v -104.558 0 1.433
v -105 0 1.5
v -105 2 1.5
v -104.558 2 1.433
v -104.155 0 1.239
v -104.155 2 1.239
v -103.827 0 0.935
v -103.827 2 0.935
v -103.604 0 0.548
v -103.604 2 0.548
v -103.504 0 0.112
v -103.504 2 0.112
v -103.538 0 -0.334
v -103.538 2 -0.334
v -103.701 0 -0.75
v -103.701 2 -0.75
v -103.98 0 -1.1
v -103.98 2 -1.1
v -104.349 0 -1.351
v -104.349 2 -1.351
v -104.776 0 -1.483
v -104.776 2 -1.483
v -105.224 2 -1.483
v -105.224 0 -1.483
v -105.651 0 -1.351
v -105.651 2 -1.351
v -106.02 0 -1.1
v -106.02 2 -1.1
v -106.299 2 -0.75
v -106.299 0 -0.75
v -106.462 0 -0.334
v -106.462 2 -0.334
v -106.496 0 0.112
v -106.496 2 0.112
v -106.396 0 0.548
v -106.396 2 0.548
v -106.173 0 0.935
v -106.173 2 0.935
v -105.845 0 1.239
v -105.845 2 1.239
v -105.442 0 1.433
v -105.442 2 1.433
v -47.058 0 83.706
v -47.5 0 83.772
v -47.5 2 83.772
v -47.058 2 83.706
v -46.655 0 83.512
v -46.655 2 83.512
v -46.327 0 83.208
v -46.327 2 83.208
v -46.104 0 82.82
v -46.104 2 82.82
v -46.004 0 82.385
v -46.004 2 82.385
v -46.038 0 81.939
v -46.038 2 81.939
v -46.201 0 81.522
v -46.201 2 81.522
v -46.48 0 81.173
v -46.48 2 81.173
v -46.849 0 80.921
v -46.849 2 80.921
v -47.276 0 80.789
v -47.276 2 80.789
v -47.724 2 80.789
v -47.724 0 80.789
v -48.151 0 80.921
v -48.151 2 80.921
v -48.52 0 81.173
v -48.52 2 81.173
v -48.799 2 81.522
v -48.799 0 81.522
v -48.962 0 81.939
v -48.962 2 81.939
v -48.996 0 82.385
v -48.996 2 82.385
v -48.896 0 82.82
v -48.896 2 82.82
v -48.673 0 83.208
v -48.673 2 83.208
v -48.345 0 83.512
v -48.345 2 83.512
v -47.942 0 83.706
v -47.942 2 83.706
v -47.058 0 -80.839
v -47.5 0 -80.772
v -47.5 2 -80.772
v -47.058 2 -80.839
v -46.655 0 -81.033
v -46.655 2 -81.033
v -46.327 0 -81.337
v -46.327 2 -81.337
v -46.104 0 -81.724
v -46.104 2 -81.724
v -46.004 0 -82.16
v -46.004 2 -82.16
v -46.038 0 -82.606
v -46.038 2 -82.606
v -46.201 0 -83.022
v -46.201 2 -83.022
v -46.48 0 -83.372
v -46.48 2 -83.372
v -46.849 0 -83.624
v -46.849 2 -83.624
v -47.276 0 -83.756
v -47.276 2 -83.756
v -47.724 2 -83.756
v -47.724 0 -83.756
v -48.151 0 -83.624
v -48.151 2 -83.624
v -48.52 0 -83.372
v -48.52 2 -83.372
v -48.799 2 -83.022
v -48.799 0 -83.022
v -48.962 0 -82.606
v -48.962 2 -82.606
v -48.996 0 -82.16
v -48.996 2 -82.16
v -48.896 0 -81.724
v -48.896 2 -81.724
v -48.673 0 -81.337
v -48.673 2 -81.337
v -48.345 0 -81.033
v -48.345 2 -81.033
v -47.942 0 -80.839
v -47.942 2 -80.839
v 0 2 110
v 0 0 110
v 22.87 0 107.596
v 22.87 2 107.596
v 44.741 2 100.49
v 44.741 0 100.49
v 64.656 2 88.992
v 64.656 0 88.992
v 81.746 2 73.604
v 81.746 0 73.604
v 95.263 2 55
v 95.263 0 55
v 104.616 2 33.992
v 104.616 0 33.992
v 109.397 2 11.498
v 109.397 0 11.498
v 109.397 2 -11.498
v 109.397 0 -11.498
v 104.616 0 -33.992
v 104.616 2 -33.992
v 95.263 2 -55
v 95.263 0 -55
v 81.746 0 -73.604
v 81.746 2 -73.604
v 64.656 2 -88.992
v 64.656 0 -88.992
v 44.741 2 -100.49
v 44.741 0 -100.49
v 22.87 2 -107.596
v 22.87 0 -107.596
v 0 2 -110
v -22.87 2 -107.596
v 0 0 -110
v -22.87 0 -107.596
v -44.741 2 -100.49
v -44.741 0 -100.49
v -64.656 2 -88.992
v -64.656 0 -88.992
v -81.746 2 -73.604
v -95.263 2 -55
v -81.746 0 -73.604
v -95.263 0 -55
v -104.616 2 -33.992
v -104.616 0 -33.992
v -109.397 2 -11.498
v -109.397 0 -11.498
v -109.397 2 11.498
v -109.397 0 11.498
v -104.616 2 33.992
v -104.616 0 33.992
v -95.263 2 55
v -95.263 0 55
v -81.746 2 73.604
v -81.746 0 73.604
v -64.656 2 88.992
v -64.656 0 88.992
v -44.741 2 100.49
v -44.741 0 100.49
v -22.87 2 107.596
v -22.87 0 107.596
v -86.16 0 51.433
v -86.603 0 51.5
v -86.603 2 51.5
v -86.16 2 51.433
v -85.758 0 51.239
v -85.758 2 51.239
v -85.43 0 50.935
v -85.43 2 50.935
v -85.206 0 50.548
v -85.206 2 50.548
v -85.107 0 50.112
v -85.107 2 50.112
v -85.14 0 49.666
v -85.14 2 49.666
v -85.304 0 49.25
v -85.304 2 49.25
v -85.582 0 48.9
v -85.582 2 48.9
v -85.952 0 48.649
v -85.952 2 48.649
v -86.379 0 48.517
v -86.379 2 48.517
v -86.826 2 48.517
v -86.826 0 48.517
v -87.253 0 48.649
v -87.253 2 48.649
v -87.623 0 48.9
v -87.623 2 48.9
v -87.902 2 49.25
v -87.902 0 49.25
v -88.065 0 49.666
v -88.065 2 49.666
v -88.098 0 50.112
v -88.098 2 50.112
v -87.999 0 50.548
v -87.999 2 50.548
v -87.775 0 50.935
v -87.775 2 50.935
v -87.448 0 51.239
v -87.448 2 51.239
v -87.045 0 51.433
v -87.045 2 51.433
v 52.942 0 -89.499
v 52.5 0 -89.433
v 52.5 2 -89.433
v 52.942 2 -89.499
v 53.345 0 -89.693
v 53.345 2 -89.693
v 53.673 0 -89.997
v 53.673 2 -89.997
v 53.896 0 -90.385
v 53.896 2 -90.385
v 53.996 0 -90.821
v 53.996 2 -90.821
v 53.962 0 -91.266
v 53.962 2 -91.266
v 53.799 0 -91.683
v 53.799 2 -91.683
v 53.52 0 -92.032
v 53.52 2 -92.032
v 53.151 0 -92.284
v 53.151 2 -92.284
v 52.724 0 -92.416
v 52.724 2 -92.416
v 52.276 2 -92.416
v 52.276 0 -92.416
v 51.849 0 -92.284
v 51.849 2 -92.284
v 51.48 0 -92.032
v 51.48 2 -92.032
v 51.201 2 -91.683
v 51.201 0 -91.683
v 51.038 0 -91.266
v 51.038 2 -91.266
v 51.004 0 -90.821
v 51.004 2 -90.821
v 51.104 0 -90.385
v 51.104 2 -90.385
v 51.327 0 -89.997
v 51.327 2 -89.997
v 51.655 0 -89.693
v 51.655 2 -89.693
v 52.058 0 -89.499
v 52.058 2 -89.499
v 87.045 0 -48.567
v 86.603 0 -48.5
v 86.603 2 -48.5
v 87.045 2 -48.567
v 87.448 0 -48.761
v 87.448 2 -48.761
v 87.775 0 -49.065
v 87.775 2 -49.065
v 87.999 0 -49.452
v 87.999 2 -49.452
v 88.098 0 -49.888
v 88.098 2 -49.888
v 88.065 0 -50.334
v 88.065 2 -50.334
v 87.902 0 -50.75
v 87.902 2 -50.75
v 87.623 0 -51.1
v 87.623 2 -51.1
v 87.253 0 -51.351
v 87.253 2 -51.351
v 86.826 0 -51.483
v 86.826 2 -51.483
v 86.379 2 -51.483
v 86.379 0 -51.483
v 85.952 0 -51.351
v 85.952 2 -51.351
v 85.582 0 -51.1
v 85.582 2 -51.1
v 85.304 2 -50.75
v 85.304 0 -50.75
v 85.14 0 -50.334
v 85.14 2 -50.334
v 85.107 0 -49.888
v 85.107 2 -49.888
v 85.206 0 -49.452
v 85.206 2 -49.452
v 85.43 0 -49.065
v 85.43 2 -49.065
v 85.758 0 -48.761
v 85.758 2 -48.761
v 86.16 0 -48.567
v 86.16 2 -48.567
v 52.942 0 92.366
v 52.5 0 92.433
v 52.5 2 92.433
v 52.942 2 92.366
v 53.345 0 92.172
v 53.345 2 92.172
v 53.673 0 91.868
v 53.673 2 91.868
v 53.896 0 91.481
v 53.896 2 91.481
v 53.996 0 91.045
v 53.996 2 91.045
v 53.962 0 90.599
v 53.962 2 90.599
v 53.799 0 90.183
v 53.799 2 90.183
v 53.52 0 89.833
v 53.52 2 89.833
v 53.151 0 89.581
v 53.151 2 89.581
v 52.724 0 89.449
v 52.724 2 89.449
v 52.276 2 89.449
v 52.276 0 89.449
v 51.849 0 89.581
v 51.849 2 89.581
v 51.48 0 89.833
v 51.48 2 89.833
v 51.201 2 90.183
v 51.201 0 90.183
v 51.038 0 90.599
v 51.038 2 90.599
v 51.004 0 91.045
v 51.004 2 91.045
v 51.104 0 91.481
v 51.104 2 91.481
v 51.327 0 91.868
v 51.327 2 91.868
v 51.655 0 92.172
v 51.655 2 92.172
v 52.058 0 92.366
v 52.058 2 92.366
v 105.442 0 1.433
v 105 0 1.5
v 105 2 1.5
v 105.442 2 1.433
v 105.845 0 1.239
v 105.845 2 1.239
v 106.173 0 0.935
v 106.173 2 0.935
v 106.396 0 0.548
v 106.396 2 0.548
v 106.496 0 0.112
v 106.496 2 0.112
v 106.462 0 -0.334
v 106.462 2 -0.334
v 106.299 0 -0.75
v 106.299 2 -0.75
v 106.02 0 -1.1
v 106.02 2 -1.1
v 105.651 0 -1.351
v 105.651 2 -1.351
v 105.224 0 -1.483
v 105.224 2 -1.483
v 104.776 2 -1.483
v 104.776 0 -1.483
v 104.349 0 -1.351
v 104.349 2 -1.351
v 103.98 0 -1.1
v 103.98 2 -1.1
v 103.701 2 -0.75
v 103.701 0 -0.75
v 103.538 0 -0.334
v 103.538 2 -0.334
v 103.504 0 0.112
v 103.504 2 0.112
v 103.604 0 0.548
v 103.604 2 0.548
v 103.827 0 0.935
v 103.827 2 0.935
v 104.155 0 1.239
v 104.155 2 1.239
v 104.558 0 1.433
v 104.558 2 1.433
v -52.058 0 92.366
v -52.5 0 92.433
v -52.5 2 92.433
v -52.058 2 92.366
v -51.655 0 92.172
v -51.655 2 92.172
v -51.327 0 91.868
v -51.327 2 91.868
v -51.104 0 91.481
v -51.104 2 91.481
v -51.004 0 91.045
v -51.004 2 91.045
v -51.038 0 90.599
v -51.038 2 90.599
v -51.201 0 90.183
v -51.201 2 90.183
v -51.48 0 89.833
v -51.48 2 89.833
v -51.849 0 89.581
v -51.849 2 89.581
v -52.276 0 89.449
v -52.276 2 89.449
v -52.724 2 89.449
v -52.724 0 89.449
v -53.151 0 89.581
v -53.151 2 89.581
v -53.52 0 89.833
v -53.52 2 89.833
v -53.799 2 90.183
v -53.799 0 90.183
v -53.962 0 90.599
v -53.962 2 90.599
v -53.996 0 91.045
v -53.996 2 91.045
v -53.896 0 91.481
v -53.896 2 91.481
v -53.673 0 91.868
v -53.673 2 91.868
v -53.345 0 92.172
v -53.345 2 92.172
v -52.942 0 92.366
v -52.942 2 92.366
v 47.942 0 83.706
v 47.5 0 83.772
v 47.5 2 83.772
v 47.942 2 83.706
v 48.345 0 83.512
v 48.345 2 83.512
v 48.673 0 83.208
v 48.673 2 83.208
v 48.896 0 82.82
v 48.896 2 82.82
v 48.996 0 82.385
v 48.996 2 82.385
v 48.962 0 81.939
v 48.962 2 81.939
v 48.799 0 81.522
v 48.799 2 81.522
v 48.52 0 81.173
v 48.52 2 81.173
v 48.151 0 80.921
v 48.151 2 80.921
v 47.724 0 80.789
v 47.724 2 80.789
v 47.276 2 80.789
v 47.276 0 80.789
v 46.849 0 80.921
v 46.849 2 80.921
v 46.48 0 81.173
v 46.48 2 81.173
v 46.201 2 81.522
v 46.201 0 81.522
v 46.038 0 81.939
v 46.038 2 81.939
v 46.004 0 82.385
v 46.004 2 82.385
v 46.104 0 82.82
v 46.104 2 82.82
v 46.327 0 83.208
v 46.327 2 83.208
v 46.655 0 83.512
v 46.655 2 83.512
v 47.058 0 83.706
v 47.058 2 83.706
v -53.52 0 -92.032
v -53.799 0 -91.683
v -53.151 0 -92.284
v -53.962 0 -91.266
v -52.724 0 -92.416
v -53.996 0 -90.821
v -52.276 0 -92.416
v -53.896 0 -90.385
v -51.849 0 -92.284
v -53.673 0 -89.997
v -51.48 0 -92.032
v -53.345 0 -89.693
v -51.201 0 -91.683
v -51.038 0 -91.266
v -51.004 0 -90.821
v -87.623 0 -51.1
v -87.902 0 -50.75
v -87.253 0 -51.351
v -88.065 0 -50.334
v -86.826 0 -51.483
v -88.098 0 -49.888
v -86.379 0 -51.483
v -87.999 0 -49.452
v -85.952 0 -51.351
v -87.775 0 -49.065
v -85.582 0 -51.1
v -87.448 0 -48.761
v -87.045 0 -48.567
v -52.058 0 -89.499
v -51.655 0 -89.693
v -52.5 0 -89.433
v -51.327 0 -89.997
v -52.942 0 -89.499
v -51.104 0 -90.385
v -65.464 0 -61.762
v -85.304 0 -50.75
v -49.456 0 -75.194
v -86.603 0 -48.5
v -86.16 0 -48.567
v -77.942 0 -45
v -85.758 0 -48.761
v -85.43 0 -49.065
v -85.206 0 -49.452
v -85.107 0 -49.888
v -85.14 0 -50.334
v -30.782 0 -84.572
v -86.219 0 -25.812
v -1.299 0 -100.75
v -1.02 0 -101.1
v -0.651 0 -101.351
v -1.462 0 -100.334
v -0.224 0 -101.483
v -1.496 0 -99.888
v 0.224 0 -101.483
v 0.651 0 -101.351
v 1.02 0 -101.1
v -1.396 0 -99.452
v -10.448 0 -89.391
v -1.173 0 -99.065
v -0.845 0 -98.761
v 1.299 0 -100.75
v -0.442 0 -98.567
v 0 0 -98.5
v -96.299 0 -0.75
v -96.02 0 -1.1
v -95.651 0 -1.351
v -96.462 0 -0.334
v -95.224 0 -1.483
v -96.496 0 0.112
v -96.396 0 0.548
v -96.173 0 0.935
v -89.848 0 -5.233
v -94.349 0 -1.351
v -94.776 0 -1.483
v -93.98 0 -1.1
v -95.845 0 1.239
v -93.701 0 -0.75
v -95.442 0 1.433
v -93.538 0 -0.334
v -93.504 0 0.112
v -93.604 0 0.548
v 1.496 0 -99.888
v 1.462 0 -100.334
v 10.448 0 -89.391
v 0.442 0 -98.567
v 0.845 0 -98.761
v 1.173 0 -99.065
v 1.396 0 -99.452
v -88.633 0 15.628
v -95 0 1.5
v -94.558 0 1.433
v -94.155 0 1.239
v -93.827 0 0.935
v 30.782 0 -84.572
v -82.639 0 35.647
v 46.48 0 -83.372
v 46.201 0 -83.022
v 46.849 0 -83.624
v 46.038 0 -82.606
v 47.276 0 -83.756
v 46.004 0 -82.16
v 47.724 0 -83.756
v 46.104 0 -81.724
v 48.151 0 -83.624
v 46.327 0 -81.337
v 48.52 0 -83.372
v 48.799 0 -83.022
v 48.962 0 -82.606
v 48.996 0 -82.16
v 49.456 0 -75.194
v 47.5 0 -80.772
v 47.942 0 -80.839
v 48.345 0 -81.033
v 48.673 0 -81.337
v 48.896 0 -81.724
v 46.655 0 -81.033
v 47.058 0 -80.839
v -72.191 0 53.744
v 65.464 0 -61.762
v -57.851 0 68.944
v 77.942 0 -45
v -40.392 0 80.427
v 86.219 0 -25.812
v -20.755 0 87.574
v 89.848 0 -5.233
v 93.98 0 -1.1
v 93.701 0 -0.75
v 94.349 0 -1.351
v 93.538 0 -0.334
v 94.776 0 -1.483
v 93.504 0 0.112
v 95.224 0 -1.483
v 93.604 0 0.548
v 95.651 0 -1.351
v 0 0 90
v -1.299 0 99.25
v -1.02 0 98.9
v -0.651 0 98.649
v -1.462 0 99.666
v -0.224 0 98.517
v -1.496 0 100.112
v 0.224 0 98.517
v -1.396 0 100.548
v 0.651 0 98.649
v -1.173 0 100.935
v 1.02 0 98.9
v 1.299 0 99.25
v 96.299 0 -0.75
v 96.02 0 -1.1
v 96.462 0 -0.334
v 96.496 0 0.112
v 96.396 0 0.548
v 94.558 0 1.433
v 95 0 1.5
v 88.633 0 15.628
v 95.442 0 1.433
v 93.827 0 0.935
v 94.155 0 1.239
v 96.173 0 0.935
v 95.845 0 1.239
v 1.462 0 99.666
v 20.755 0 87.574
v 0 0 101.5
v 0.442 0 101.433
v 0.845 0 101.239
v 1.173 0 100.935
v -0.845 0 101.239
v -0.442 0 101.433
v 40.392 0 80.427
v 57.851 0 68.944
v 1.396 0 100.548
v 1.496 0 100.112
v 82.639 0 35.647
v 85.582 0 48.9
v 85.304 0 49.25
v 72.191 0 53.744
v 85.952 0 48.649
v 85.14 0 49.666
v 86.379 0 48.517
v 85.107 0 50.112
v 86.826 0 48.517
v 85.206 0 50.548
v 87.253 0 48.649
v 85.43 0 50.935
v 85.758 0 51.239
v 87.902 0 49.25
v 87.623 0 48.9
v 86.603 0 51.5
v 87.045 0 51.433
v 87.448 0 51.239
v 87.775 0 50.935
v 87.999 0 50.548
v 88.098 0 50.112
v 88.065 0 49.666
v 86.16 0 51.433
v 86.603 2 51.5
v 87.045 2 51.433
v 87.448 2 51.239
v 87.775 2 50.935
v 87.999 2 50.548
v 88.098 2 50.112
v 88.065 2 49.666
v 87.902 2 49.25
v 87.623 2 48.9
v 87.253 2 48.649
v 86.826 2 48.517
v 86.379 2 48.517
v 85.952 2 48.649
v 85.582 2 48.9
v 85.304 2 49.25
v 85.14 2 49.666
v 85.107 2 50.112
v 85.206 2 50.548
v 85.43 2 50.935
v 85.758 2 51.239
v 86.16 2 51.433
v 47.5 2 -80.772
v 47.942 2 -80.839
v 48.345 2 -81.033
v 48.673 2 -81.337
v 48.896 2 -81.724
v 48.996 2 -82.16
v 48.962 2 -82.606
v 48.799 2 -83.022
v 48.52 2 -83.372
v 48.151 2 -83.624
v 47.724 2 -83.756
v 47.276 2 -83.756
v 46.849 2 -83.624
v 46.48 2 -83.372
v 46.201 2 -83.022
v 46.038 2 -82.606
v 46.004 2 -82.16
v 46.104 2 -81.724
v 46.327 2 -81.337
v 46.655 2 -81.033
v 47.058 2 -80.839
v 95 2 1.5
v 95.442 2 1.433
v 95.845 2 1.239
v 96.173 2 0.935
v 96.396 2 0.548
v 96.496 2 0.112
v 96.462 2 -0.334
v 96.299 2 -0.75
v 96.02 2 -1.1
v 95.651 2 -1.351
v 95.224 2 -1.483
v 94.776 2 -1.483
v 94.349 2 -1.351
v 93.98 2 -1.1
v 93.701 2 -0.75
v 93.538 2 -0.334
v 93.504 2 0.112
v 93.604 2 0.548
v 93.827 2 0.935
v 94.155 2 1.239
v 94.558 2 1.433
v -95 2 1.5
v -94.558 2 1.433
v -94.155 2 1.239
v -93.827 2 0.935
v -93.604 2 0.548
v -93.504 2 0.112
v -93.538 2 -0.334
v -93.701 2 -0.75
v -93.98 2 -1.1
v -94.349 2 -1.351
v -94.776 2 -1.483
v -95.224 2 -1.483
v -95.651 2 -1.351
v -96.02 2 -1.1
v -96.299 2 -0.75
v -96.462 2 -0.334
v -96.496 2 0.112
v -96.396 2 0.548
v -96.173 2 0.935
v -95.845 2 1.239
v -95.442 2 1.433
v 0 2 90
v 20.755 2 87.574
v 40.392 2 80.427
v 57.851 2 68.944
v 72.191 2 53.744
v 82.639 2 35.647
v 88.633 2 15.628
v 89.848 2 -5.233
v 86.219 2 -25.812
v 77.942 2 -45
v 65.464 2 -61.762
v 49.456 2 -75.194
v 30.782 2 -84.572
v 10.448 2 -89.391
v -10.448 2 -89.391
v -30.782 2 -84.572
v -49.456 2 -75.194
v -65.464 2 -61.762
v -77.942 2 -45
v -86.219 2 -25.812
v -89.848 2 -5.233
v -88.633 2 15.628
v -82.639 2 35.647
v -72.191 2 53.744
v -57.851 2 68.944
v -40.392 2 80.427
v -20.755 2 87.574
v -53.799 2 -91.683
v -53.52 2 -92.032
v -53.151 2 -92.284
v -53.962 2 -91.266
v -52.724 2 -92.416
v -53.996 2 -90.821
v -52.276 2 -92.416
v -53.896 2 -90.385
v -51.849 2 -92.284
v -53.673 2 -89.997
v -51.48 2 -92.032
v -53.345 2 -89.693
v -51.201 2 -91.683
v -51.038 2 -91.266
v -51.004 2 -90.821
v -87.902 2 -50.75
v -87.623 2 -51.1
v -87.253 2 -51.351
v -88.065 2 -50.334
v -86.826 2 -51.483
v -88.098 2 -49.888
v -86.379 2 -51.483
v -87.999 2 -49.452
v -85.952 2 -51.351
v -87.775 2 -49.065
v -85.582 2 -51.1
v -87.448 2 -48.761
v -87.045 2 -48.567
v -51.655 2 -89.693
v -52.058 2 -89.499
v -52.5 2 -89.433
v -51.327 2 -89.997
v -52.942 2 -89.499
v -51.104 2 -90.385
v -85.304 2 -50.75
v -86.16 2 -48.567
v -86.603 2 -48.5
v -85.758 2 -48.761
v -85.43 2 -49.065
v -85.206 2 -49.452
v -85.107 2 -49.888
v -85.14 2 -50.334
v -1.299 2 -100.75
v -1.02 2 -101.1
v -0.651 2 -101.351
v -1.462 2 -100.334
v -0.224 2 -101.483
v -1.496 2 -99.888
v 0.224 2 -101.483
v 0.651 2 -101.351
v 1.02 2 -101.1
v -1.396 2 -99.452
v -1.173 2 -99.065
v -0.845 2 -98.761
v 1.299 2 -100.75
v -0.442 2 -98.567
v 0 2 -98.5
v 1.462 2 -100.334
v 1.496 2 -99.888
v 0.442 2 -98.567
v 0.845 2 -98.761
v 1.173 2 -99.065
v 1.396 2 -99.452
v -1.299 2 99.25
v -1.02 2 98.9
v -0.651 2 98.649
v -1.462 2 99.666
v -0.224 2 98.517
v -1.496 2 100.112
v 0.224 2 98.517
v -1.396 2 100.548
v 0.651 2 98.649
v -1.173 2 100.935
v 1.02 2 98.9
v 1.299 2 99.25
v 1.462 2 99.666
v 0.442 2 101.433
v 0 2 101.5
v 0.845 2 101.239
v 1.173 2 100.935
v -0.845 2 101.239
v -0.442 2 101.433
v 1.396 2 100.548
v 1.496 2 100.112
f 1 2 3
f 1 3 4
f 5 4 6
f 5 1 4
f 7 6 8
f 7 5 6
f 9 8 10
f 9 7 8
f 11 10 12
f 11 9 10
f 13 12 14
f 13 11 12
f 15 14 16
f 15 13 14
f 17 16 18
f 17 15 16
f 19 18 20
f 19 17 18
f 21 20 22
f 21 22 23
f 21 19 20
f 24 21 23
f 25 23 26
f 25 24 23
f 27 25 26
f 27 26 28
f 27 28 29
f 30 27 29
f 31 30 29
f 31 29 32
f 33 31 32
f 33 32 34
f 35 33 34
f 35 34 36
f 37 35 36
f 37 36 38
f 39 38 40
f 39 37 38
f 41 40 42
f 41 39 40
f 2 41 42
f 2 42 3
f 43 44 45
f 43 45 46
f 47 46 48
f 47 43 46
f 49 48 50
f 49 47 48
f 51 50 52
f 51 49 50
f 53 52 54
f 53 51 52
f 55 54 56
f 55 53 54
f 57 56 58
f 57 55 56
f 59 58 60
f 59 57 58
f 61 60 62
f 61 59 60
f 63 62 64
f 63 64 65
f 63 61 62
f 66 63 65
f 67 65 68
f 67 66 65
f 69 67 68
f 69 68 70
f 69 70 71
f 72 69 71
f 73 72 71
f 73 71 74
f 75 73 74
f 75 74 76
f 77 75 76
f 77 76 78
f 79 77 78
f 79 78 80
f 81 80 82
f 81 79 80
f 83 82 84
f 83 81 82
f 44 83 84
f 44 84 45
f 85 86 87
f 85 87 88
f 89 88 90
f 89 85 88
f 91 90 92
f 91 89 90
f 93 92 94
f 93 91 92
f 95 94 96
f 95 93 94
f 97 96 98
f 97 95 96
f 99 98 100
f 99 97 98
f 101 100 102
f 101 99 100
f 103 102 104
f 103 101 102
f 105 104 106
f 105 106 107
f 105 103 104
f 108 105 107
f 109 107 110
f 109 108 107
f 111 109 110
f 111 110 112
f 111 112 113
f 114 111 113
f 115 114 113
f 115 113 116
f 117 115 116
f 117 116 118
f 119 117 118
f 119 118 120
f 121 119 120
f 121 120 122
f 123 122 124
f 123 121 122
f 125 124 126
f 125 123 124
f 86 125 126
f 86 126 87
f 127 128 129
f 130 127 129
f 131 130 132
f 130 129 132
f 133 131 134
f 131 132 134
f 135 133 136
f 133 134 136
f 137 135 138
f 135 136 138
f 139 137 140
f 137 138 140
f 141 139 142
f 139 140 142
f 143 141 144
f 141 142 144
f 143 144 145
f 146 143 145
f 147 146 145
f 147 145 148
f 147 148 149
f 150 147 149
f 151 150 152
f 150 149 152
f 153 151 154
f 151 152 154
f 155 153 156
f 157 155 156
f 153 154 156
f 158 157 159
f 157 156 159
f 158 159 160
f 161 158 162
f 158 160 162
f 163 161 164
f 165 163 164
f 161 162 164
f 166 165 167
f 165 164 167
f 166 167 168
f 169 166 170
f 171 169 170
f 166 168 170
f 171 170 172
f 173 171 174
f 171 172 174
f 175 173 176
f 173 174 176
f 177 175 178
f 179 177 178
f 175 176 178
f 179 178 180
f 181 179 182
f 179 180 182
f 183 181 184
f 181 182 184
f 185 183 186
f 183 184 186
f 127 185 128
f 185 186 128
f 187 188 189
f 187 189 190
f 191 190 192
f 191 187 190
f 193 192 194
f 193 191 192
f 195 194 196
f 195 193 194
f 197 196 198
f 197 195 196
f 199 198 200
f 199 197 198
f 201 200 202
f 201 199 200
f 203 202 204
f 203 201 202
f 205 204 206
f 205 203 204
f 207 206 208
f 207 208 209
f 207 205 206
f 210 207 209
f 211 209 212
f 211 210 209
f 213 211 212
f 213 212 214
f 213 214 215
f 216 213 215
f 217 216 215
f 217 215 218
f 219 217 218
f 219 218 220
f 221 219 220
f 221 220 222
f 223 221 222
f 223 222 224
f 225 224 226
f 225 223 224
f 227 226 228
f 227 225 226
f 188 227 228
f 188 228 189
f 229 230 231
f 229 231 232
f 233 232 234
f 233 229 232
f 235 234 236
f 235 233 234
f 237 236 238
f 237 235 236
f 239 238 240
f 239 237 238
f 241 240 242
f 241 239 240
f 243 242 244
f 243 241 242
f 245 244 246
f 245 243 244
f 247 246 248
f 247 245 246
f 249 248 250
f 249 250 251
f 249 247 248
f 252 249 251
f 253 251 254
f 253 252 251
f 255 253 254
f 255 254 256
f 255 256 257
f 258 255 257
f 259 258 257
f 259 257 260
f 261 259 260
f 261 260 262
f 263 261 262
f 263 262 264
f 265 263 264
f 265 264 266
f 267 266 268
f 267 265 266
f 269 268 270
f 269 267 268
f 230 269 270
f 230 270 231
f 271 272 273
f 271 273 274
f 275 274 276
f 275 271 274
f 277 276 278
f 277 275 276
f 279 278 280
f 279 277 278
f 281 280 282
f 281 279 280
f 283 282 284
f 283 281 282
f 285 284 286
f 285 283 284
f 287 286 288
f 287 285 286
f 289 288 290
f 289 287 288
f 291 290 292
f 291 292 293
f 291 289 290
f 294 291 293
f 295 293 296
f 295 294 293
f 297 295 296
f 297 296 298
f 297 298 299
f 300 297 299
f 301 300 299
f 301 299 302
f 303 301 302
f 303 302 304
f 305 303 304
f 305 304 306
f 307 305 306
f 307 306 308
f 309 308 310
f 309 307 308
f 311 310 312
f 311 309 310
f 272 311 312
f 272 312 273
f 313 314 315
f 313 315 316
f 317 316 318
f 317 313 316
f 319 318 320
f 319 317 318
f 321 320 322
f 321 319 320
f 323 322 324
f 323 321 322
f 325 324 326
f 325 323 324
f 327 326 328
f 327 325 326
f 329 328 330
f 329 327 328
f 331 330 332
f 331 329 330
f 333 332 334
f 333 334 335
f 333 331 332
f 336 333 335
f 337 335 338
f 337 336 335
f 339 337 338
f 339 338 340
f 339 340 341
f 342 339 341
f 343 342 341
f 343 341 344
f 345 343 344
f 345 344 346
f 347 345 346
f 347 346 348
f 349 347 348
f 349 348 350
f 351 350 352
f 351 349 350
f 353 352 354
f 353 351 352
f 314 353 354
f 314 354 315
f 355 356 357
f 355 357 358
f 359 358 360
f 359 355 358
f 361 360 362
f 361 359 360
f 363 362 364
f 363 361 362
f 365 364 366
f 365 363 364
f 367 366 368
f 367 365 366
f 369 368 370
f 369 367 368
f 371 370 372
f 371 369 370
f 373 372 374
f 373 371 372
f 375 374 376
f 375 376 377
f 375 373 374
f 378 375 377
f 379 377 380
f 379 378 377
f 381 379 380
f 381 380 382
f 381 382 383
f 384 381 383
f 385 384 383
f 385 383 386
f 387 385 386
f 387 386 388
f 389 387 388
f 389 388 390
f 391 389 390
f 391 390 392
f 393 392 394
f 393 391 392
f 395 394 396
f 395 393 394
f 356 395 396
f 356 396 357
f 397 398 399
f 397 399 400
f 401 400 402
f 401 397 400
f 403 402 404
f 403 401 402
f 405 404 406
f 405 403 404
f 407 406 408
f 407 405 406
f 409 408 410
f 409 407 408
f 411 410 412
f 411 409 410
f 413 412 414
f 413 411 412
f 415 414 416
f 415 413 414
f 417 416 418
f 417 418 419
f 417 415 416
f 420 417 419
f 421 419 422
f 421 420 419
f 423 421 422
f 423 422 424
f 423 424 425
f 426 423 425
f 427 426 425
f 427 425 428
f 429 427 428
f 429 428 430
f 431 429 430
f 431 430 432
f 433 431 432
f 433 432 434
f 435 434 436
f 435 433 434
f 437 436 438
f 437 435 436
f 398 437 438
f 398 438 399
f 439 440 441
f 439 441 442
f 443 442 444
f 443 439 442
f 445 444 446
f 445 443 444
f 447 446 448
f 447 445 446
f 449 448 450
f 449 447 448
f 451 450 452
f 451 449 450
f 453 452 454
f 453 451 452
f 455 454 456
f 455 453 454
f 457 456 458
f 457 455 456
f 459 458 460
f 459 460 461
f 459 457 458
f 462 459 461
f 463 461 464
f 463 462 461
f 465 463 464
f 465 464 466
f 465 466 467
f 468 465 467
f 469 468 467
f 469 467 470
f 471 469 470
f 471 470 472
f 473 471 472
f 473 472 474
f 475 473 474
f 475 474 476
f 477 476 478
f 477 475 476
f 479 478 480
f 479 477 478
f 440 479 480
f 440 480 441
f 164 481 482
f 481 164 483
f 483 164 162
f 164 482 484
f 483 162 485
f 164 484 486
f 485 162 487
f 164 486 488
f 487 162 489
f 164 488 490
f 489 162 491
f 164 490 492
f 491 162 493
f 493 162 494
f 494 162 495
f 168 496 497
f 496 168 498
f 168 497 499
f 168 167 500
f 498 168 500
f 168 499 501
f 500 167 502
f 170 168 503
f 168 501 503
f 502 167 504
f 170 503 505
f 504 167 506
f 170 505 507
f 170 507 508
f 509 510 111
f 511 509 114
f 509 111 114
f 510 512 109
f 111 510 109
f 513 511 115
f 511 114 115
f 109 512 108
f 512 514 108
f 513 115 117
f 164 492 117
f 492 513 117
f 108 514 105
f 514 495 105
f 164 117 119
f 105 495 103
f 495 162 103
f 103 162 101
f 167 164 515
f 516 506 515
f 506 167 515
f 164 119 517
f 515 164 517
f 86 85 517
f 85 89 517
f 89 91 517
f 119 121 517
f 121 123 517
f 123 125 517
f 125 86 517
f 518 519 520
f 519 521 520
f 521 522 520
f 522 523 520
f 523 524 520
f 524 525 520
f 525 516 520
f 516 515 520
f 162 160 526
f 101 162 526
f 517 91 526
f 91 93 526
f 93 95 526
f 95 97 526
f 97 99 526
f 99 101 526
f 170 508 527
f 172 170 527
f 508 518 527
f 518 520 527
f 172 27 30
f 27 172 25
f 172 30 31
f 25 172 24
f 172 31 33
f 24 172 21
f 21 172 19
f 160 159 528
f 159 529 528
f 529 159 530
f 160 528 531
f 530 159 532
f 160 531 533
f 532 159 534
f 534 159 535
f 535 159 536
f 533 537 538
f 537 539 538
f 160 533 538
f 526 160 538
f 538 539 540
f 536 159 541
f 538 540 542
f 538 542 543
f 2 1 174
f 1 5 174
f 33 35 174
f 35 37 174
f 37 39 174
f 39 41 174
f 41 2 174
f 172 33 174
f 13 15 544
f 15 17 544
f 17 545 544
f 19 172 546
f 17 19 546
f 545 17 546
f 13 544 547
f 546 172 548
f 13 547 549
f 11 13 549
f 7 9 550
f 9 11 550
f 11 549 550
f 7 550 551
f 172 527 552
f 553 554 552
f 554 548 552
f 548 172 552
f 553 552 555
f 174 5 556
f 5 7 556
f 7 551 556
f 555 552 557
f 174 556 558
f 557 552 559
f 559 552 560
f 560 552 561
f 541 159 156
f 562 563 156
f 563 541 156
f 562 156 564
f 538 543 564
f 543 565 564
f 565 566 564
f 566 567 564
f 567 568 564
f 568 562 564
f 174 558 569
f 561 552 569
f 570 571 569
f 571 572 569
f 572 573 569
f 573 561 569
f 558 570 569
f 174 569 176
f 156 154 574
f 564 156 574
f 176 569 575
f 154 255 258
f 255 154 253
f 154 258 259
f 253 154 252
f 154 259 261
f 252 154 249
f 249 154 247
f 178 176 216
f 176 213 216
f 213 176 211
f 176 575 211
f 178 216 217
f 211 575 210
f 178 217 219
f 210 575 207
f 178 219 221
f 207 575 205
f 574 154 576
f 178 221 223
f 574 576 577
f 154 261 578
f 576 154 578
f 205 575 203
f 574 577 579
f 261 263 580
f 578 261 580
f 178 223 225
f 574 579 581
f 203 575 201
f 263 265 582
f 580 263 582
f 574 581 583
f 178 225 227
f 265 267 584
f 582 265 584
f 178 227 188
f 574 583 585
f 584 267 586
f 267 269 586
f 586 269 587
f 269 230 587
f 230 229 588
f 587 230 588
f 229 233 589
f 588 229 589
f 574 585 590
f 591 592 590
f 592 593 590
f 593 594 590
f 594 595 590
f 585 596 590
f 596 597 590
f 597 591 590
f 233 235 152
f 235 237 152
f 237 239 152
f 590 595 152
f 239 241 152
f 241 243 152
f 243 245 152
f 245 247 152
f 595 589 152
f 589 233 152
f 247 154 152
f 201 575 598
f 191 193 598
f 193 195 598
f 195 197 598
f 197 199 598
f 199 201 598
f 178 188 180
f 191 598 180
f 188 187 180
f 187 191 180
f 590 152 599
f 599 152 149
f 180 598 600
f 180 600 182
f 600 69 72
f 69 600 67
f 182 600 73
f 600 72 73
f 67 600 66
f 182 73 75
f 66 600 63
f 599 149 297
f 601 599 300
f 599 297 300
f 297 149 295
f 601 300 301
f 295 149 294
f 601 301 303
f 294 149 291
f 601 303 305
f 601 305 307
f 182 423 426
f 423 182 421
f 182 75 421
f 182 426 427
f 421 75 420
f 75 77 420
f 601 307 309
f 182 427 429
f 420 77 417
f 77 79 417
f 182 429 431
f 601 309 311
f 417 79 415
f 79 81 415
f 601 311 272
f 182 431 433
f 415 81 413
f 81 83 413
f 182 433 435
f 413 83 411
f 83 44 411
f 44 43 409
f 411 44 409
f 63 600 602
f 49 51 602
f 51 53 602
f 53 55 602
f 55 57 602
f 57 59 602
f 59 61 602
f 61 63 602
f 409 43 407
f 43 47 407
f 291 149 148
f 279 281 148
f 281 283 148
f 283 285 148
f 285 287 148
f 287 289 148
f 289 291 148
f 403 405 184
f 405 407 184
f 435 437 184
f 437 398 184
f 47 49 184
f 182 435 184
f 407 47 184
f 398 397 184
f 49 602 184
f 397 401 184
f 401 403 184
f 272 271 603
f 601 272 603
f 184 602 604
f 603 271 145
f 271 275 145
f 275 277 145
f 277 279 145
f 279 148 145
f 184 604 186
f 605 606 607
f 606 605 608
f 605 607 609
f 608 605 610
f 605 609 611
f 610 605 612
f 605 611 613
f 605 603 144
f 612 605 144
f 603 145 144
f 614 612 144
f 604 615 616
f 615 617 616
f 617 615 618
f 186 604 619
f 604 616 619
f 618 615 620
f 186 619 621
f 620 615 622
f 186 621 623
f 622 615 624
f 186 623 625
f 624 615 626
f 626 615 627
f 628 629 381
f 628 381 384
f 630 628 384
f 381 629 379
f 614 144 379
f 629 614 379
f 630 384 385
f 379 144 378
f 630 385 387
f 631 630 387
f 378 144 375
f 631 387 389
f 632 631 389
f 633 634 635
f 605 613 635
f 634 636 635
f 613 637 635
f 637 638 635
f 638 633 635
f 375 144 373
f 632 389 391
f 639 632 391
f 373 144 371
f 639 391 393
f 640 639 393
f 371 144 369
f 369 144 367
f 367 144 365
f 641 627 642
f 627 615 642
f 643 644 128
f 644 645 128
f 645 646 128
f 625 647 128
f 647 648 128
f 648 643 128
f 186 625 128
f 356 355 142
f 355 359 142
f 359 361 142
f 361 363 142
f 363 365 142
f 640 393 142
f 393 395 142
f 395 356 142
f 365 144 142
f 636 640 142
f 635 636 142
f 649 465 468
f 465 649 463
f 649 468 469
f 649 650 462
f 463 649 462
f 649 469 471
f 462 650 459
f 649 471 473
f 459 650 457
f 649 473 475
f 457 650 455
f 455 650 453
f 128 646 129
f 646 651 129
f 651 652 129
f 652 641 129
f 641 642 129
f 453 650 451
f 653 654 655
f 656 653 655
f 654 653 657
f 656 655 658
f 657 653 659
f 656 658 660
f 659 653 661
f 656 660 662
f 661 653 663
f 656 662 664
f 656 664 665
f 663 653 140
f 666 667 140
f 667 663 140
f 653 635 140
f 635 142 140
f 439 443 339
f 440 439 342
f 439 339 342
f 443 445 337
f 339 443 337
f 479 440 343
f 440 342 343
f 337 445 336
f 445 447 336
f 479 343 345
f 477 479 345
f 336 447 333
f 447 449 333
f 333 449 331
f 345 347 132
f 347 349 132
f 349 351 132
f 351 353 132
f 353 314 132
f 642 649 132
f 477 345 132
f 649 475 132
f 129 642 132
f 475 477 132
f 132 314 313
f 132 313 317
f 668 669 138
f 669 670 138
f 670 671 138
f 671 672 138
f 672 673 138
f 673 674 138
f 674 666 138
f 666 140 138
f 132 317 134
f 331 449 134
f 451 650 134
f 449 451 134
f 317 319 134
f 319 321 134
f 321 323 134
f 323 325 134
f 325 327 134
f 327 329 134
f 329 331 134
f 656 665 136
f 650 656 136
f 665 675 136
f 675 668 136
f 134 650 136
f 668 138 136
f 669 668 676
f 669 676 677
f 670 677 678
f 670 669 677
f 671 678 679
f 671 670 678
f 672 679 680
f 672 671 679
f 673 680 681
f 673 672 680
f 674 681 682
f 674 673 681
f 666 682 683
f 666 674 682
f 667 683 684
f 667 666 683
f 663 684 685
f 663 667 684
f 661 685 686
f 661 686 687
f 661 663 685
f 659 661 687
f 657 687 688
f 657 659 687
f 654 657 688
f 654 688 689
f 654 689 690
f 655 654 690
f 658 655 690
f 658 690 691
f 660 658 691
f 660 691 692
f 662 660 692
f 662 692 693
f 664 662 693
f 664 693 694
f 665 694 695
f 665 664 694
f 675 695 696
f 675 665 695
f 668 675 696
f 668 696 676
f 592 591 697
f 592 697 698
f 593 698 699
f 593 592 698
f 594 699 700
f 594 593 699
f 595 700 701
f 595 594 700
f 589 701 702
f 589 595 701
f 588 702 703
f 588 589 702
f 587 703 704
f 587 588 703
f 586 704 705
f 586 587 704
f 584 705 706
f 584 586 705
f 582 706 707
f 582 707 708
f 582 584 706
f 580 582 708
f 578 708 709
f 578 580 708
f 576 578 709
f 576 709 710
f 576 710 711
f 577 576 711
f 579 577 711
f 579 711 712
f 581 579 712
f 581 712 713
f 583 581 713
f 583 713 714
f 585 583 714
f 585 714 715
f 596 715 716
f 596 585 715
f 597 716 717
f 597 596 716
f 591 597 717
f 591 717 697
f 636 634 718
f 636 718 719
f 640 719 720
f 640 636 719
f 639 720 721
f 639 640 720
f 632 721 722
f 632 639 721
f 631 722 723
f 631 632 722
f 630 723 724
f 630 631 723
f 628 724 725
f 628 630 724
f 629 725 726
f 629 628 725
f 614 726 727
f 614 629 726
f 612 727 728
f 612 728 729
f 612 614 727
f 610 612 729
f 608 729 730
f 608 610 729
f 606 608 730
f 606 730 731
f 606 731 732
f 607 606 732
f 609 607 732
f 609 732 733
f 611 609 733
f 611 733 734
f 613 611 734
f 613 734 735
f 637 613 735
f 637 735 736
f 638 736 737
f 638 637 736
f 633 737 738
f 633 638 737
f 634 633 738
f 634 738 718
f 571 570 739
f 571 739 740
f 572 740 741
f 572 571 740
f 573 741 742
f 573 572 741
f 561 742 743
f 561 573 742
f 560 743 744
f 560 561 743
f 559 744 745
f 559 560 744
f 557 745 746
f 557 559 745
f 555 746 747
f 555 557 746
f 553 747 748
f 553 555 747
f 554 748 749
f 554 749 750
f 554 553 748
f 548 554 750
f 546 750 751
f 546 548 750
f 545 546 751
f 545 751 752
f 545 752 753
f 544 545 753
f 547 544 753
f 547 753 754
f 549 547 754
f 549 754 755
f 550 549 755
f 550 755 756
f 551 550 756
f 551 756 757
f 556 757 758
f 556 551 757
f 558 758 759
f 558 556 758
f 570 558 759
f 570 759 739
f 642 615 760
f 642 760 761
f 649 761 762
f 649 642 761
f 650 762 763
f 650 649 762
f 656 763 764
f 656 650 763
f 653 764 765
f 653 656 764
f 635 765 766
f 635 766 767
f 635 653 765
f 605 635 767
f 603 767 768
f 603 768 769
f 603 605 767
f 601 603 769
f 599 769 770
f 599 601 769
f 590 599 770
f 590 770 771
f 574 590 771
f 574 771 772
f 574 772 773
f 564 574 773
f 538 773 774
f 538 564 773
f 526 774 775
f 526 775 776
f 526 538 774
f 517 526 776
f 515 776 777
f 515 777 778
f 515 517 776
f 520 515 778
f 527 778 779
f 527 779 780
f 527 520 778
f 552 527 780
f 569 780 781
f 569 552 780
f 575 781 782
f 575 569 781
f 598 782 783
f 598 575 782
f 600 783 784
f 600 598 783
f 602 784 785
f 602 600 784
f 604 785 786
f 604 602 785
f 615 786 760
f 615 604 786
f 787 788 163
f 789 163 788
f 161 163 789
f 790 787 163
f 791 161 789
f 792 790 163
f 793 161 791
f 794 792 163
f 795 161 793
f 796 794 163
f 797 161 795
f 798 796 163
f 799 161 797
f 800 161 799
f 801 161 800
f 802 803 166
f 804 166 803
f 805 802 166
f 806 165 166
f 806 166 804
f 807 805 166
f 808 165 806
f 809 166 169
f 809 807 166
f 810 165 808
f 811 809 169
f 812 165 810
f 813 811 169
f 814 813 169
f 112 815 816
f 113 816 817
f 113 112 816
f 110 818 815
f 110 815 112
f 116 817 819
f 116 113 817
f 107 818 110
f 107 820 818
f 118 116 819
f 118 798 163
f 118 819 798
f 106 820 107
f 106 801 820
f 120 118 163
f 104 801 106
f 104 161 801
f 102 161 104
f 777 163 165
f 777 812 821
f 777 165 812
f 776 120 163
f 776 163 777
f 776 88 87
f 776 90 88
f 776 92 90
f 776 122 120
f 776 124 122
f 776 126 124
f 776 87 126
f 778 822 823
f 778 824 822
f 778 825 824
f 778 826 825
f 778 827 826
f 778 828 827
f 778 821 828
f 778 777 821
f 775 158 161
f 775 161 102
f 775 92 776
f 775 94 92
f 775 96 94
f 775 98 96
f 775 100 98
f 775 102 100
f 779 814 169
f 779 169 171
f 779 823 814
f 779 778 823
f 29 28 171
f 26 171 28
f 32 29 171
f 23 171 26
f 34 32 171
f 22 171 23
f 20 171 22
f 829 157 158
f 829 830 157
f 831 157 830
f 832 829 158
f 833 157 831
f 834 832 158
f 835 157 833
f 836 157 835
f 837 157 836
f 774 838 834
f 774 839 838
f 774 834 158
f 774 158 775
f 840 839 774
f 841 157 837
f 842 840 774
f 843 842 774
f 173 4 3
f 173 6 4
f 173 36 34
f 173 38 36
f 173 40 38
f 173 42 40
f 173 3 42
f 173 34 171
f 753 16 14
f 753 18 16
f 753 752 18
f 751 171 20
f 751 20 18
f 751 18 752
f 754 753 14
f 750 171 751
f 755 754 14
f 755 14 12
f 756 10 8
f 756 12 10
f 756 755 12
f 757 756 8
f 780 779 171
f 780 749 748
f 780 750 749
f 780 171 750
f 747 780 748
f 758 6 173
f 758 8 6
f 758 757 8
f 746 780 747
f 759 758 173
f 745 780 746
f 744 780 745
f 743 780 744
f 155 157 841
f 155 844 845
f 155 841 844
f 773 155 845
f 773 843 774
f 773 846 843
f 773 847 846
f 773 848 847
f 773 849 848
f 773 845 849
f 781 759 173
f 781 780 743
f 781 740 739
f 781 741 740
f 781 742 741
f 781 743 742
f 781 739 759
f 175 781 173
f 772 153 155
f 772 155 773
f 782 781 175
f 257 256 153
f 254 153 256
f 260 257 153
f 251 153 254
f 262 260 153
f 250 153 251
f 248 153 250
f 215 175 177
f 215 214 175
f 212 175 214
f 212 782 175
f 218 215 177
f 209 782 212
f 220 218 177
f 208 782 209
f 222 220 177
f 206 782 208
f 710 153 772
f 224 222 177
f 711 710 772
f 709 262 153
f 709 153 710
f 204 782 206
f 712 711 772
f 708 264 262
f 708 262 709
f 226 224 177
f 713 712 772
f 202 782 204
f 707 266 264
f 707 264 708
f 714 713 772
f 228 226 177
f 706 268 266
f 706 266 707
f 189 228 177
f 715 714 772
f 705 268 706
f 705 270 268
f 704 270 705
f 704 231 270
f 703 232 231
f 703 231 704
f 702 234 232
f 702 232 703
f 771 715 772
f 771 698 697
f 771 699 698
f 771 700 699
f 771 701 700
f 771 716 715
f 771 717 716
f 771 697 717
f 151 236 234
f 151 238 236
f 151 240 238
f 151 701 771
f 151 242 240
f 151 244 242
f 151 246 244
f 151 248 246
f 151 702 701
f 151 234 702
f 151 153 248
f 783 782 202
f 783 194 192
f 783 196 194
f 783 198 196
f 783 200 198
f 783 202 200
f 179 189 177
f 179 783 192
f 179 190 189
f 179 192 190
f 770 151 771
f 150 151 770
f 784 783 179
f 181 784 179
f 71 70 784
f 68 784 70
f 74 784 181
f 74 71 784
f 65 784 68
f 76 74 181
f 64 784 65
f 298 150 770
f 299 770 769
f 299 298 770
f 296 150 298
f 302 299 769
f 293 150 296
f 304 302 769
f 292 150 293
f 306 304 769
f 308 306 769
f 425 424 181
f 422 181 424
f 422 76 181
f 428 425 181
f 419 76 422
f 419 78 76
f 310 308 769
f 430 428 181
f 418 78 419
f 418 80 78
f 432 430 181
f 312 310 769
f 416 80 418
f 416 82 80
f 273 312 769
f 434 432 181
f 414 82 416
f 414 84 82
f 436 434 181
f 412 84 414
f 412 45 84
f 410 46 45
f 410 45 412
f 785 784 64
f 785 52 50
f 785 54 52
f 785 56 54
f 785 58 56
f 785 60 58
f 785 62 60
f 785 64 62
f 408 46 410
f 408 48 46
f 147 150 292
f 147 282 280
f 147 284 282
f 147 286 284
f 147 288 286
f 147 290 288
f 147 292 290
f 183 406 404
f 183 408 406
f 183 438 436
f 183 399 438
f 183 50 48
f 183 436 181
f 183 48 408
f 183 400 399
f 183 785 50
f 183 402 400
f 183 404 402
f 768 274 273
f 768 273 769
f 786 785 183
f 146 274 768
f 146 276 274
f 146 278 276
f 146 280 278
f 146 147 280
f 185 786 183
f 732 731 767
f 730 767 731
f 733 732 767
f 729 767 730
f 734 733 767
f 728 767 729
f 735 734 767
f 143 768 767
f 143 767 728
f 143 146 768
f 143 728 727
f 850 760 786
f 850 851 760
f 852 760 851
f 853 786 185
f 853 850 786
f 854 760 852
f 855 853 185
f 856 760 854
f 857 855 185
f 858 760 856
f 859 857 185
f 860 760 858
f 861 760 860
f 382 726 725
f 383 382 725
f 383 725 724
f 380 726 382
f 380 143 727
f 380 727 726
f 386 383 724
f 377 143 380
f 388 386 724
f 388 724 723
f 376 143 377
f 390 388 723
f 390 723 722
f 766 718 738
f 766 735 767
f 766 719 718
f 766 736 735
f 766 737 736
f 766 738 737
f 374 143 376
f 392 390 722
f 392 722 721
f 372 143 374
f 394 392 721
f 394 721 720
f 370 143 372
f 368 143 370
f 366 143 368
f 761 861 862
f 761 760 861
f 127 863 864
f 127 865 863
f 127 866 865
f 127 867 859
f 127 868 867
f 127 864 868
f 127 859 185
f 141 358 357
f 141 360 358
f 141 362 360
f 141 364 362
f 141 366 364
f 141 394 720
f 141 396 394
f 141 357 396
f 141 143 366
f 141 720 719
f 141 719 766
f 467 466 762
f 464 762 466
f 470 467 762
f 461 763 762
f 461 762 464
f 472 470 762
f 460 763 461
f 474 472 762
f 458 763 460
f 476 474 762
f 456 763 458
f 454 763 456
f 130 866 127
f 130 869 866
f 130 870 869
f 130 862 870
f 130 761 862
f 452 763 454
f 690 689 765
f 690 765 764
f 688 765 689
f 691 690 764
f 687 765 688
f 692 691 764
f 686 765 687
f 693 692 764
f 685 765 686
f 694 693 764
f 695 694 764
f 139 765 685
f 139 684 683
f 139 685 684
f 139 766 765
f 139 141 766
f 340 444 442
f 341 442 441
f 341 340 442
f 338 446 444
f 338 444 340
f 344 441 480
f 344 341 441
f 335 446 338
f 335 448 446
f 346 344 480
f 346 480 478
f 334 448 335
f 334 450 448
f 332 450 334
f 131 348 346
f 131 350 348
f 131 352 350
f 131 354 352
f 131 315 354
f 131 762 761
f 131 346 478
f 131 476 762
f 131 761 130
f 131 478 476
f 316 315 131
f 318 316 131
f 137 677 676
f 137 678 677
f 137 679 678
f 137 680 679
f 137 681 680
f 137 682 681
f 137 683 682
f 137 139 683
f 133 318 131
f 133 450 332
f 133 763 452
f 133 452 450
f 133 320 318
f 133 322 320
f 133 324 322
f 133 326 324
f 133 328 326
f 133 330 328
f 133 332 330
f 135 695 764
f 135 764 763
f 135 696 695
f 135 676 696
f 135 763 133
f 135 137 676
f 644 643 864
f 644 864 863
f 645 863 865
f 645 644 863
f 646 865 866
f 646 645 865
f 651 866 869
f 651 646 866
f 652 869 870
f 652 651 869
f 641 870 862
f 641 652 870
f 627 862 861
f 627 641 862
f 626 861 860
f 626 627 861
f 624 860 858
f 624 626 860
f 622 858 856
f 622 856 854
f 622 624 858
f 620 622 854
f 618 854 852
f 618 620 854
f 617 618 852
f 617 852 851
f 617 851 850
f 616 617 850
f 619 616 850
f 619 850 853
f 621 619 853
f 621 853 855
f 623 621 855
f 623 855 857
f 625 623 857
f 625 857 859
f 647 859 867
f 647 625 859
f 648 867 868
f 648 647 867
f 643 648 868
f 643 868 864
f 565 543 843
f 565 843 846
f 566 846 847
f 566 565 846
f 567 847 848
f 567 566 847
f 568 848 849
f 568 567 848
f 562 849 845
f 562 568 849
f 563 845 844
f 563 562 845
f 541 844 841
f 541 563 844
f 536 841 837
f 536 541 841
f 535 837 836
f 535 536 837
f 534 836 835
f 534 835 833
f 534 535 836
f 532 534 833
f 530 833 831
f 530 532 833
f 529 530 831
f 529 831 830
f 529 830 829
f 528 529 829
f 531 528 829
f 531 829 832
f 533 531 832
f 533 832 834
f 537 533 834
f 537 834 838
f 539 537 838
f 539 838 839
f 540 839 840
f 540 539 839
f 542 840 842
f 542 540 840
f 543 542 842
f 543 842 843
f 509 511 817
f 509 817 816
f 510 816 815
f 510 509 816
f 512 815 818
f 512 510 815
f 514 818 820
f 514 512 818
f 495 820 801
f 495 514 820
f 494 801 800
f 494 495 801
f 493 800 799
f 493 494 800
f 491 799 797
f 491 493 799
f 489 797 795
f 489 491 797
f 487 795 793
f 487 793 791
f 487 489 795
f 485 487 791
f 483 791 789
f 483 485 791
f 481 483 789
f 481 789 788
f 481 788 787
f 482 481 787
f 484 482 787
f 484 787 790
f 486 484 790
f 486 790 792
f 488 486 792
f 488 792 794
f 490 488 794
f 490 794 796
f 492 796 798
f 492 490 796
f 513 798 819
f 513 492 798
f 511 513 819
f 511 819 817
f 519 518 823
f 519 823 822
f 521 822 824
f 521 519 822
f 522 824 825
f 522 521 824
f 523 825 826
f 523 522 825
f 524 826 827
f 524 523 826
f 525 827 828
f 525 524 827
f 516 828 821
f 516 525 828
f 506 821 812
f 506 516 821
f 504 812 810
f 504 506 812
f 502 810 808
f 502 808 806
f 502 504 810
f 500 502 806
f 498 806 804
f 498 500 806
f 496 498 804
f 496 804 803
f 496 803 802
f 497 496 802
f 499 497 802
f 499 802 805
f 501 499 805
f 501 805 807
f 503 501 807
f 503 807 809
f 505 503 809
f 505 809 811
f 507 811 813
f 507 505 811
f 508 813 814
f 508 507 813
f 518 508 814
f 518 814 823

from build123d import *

# Parameters (mm, degrees)
SKETCH1_R           = 110
SKETCH1_R_2         = 90
SKETCH1_R_3         = 1.5
BOSS_EXTRUDE1_DEPTH = 2


with BuildPart() as part:
    # Sketch1 → Boss-Extrude1 (new body)
    with BuildSketch(Plane(origin=(0, 0, 0), x_dir=(1, 0, 0), z_dir=(0, 1, 0))):
        with Locations(Location((0, 0, 0), (0, 0, 270))):
            Circle(SKETCH1_R)
        with Locations(Location((0, 0, 0), (0, 0, 270))):
            Circle(SKETCH1_R_2, mode=Mode.SUBTRACT)
        with Locations(Location((95, 0, 0), (0, 0, 270))):
            Circle(SKETCH1_R_3, mode=Mode.SUBTRACT)
        with Locations(Location((105, 0, 0), (0, 0, 270))):
            Circle(SKETCH1_R_3, mode=Mode.SUBTRACT)
        with Locations(Location((86.602540378, 50, 0), (0, 0, 270))):
            Circle(SKETCH1_R_3, mode=Mode.SUBTRACT)
        with Locations(Location((86.602540378, -50, 0), (0, 0, 270))):
            Circle(SKETCH1_R_3, mode=Mode.SUBTRACT)
        with Locations(Location((52.5, -90.932667397, 0), (0, 0, 270))):
            Circle(SKETCH1_R_3, mode=Mode.SUBTRACT)
        with Locations(Location((47.5, -82.27241336, 0), (0, 0, 270))):
            Circle(SKETCH1_R_3, mode=Mode.SUBTRACT)
        with Locations(Location((0, -100, 0), (0, 0, 270))):
            Circle(SKETCH1_R_3, mode=Mode.SUBTRACT)
        with Locations(Location((-52.5, -90.932667397, 0), (0, 0, 270))):
            Circle(SKETCH1_R_3, mode=Mode.SUBTRACT)
        with Locations(Location((-47.5, -82.27241336, 0), (0, 0, 270))):
            Circle(SKETCH1_R_3, mode=Mode.SUBTRACT)
        with Locations(Location((-86.602540378, -50, 0), (0, 0, 270))):
            Circle(SKETCH1_R_3, mode=Mode.SUBTRACT)
        with Locations(Location((-105, 0, 0), (0, 0, 270))):
            Circle(SKETCH1_R_3, mode=Mode.SUBTRACT)
        with Locations(Location((-95, 0, 0), (0, 0, 270))):
            Circle(SKETCH1_R_3, mode=Mode.SUBTRACT)
        with Locations(Location((-86.602540378, 50, 0), (0, 0, 270))):
            Circle(SKETCH1_R_3, mode=Mode.SUBTRACT)
        with Locations(Location((-52.5, 90.932667397, 0), (0, 0, 270))):
            Circle(SKETCH1_R_3, mode=Mode.SUBTRACT)
        with Locations(Location((-47.5, 82.27241336, 0), (0, 0, 270))):
            Circle(SKETCH1_R_3, mode=Mode.SUBTRACT)
        with Locations(Location((0, 100, 0), (0, 0, 270))):
            Circle(SKETCH1_R_3, mode=Mode.SUBTRACT)
        with Locations(Location((52.5, 90.932667397, 0), (0, 0, 270))):
            Circle(SKETCH1_R_3, mode=Mode.SUBTRACT)
        with Locations(Location((47.5, 82.27241336, 0), (0, 0, 270))):
            Circle(SKETCH1_R_3, mode=Mode.SUBTRACT)
    extrude(amount=BOSS_EXTRUDE1_DEPTH)


solid = part.part
